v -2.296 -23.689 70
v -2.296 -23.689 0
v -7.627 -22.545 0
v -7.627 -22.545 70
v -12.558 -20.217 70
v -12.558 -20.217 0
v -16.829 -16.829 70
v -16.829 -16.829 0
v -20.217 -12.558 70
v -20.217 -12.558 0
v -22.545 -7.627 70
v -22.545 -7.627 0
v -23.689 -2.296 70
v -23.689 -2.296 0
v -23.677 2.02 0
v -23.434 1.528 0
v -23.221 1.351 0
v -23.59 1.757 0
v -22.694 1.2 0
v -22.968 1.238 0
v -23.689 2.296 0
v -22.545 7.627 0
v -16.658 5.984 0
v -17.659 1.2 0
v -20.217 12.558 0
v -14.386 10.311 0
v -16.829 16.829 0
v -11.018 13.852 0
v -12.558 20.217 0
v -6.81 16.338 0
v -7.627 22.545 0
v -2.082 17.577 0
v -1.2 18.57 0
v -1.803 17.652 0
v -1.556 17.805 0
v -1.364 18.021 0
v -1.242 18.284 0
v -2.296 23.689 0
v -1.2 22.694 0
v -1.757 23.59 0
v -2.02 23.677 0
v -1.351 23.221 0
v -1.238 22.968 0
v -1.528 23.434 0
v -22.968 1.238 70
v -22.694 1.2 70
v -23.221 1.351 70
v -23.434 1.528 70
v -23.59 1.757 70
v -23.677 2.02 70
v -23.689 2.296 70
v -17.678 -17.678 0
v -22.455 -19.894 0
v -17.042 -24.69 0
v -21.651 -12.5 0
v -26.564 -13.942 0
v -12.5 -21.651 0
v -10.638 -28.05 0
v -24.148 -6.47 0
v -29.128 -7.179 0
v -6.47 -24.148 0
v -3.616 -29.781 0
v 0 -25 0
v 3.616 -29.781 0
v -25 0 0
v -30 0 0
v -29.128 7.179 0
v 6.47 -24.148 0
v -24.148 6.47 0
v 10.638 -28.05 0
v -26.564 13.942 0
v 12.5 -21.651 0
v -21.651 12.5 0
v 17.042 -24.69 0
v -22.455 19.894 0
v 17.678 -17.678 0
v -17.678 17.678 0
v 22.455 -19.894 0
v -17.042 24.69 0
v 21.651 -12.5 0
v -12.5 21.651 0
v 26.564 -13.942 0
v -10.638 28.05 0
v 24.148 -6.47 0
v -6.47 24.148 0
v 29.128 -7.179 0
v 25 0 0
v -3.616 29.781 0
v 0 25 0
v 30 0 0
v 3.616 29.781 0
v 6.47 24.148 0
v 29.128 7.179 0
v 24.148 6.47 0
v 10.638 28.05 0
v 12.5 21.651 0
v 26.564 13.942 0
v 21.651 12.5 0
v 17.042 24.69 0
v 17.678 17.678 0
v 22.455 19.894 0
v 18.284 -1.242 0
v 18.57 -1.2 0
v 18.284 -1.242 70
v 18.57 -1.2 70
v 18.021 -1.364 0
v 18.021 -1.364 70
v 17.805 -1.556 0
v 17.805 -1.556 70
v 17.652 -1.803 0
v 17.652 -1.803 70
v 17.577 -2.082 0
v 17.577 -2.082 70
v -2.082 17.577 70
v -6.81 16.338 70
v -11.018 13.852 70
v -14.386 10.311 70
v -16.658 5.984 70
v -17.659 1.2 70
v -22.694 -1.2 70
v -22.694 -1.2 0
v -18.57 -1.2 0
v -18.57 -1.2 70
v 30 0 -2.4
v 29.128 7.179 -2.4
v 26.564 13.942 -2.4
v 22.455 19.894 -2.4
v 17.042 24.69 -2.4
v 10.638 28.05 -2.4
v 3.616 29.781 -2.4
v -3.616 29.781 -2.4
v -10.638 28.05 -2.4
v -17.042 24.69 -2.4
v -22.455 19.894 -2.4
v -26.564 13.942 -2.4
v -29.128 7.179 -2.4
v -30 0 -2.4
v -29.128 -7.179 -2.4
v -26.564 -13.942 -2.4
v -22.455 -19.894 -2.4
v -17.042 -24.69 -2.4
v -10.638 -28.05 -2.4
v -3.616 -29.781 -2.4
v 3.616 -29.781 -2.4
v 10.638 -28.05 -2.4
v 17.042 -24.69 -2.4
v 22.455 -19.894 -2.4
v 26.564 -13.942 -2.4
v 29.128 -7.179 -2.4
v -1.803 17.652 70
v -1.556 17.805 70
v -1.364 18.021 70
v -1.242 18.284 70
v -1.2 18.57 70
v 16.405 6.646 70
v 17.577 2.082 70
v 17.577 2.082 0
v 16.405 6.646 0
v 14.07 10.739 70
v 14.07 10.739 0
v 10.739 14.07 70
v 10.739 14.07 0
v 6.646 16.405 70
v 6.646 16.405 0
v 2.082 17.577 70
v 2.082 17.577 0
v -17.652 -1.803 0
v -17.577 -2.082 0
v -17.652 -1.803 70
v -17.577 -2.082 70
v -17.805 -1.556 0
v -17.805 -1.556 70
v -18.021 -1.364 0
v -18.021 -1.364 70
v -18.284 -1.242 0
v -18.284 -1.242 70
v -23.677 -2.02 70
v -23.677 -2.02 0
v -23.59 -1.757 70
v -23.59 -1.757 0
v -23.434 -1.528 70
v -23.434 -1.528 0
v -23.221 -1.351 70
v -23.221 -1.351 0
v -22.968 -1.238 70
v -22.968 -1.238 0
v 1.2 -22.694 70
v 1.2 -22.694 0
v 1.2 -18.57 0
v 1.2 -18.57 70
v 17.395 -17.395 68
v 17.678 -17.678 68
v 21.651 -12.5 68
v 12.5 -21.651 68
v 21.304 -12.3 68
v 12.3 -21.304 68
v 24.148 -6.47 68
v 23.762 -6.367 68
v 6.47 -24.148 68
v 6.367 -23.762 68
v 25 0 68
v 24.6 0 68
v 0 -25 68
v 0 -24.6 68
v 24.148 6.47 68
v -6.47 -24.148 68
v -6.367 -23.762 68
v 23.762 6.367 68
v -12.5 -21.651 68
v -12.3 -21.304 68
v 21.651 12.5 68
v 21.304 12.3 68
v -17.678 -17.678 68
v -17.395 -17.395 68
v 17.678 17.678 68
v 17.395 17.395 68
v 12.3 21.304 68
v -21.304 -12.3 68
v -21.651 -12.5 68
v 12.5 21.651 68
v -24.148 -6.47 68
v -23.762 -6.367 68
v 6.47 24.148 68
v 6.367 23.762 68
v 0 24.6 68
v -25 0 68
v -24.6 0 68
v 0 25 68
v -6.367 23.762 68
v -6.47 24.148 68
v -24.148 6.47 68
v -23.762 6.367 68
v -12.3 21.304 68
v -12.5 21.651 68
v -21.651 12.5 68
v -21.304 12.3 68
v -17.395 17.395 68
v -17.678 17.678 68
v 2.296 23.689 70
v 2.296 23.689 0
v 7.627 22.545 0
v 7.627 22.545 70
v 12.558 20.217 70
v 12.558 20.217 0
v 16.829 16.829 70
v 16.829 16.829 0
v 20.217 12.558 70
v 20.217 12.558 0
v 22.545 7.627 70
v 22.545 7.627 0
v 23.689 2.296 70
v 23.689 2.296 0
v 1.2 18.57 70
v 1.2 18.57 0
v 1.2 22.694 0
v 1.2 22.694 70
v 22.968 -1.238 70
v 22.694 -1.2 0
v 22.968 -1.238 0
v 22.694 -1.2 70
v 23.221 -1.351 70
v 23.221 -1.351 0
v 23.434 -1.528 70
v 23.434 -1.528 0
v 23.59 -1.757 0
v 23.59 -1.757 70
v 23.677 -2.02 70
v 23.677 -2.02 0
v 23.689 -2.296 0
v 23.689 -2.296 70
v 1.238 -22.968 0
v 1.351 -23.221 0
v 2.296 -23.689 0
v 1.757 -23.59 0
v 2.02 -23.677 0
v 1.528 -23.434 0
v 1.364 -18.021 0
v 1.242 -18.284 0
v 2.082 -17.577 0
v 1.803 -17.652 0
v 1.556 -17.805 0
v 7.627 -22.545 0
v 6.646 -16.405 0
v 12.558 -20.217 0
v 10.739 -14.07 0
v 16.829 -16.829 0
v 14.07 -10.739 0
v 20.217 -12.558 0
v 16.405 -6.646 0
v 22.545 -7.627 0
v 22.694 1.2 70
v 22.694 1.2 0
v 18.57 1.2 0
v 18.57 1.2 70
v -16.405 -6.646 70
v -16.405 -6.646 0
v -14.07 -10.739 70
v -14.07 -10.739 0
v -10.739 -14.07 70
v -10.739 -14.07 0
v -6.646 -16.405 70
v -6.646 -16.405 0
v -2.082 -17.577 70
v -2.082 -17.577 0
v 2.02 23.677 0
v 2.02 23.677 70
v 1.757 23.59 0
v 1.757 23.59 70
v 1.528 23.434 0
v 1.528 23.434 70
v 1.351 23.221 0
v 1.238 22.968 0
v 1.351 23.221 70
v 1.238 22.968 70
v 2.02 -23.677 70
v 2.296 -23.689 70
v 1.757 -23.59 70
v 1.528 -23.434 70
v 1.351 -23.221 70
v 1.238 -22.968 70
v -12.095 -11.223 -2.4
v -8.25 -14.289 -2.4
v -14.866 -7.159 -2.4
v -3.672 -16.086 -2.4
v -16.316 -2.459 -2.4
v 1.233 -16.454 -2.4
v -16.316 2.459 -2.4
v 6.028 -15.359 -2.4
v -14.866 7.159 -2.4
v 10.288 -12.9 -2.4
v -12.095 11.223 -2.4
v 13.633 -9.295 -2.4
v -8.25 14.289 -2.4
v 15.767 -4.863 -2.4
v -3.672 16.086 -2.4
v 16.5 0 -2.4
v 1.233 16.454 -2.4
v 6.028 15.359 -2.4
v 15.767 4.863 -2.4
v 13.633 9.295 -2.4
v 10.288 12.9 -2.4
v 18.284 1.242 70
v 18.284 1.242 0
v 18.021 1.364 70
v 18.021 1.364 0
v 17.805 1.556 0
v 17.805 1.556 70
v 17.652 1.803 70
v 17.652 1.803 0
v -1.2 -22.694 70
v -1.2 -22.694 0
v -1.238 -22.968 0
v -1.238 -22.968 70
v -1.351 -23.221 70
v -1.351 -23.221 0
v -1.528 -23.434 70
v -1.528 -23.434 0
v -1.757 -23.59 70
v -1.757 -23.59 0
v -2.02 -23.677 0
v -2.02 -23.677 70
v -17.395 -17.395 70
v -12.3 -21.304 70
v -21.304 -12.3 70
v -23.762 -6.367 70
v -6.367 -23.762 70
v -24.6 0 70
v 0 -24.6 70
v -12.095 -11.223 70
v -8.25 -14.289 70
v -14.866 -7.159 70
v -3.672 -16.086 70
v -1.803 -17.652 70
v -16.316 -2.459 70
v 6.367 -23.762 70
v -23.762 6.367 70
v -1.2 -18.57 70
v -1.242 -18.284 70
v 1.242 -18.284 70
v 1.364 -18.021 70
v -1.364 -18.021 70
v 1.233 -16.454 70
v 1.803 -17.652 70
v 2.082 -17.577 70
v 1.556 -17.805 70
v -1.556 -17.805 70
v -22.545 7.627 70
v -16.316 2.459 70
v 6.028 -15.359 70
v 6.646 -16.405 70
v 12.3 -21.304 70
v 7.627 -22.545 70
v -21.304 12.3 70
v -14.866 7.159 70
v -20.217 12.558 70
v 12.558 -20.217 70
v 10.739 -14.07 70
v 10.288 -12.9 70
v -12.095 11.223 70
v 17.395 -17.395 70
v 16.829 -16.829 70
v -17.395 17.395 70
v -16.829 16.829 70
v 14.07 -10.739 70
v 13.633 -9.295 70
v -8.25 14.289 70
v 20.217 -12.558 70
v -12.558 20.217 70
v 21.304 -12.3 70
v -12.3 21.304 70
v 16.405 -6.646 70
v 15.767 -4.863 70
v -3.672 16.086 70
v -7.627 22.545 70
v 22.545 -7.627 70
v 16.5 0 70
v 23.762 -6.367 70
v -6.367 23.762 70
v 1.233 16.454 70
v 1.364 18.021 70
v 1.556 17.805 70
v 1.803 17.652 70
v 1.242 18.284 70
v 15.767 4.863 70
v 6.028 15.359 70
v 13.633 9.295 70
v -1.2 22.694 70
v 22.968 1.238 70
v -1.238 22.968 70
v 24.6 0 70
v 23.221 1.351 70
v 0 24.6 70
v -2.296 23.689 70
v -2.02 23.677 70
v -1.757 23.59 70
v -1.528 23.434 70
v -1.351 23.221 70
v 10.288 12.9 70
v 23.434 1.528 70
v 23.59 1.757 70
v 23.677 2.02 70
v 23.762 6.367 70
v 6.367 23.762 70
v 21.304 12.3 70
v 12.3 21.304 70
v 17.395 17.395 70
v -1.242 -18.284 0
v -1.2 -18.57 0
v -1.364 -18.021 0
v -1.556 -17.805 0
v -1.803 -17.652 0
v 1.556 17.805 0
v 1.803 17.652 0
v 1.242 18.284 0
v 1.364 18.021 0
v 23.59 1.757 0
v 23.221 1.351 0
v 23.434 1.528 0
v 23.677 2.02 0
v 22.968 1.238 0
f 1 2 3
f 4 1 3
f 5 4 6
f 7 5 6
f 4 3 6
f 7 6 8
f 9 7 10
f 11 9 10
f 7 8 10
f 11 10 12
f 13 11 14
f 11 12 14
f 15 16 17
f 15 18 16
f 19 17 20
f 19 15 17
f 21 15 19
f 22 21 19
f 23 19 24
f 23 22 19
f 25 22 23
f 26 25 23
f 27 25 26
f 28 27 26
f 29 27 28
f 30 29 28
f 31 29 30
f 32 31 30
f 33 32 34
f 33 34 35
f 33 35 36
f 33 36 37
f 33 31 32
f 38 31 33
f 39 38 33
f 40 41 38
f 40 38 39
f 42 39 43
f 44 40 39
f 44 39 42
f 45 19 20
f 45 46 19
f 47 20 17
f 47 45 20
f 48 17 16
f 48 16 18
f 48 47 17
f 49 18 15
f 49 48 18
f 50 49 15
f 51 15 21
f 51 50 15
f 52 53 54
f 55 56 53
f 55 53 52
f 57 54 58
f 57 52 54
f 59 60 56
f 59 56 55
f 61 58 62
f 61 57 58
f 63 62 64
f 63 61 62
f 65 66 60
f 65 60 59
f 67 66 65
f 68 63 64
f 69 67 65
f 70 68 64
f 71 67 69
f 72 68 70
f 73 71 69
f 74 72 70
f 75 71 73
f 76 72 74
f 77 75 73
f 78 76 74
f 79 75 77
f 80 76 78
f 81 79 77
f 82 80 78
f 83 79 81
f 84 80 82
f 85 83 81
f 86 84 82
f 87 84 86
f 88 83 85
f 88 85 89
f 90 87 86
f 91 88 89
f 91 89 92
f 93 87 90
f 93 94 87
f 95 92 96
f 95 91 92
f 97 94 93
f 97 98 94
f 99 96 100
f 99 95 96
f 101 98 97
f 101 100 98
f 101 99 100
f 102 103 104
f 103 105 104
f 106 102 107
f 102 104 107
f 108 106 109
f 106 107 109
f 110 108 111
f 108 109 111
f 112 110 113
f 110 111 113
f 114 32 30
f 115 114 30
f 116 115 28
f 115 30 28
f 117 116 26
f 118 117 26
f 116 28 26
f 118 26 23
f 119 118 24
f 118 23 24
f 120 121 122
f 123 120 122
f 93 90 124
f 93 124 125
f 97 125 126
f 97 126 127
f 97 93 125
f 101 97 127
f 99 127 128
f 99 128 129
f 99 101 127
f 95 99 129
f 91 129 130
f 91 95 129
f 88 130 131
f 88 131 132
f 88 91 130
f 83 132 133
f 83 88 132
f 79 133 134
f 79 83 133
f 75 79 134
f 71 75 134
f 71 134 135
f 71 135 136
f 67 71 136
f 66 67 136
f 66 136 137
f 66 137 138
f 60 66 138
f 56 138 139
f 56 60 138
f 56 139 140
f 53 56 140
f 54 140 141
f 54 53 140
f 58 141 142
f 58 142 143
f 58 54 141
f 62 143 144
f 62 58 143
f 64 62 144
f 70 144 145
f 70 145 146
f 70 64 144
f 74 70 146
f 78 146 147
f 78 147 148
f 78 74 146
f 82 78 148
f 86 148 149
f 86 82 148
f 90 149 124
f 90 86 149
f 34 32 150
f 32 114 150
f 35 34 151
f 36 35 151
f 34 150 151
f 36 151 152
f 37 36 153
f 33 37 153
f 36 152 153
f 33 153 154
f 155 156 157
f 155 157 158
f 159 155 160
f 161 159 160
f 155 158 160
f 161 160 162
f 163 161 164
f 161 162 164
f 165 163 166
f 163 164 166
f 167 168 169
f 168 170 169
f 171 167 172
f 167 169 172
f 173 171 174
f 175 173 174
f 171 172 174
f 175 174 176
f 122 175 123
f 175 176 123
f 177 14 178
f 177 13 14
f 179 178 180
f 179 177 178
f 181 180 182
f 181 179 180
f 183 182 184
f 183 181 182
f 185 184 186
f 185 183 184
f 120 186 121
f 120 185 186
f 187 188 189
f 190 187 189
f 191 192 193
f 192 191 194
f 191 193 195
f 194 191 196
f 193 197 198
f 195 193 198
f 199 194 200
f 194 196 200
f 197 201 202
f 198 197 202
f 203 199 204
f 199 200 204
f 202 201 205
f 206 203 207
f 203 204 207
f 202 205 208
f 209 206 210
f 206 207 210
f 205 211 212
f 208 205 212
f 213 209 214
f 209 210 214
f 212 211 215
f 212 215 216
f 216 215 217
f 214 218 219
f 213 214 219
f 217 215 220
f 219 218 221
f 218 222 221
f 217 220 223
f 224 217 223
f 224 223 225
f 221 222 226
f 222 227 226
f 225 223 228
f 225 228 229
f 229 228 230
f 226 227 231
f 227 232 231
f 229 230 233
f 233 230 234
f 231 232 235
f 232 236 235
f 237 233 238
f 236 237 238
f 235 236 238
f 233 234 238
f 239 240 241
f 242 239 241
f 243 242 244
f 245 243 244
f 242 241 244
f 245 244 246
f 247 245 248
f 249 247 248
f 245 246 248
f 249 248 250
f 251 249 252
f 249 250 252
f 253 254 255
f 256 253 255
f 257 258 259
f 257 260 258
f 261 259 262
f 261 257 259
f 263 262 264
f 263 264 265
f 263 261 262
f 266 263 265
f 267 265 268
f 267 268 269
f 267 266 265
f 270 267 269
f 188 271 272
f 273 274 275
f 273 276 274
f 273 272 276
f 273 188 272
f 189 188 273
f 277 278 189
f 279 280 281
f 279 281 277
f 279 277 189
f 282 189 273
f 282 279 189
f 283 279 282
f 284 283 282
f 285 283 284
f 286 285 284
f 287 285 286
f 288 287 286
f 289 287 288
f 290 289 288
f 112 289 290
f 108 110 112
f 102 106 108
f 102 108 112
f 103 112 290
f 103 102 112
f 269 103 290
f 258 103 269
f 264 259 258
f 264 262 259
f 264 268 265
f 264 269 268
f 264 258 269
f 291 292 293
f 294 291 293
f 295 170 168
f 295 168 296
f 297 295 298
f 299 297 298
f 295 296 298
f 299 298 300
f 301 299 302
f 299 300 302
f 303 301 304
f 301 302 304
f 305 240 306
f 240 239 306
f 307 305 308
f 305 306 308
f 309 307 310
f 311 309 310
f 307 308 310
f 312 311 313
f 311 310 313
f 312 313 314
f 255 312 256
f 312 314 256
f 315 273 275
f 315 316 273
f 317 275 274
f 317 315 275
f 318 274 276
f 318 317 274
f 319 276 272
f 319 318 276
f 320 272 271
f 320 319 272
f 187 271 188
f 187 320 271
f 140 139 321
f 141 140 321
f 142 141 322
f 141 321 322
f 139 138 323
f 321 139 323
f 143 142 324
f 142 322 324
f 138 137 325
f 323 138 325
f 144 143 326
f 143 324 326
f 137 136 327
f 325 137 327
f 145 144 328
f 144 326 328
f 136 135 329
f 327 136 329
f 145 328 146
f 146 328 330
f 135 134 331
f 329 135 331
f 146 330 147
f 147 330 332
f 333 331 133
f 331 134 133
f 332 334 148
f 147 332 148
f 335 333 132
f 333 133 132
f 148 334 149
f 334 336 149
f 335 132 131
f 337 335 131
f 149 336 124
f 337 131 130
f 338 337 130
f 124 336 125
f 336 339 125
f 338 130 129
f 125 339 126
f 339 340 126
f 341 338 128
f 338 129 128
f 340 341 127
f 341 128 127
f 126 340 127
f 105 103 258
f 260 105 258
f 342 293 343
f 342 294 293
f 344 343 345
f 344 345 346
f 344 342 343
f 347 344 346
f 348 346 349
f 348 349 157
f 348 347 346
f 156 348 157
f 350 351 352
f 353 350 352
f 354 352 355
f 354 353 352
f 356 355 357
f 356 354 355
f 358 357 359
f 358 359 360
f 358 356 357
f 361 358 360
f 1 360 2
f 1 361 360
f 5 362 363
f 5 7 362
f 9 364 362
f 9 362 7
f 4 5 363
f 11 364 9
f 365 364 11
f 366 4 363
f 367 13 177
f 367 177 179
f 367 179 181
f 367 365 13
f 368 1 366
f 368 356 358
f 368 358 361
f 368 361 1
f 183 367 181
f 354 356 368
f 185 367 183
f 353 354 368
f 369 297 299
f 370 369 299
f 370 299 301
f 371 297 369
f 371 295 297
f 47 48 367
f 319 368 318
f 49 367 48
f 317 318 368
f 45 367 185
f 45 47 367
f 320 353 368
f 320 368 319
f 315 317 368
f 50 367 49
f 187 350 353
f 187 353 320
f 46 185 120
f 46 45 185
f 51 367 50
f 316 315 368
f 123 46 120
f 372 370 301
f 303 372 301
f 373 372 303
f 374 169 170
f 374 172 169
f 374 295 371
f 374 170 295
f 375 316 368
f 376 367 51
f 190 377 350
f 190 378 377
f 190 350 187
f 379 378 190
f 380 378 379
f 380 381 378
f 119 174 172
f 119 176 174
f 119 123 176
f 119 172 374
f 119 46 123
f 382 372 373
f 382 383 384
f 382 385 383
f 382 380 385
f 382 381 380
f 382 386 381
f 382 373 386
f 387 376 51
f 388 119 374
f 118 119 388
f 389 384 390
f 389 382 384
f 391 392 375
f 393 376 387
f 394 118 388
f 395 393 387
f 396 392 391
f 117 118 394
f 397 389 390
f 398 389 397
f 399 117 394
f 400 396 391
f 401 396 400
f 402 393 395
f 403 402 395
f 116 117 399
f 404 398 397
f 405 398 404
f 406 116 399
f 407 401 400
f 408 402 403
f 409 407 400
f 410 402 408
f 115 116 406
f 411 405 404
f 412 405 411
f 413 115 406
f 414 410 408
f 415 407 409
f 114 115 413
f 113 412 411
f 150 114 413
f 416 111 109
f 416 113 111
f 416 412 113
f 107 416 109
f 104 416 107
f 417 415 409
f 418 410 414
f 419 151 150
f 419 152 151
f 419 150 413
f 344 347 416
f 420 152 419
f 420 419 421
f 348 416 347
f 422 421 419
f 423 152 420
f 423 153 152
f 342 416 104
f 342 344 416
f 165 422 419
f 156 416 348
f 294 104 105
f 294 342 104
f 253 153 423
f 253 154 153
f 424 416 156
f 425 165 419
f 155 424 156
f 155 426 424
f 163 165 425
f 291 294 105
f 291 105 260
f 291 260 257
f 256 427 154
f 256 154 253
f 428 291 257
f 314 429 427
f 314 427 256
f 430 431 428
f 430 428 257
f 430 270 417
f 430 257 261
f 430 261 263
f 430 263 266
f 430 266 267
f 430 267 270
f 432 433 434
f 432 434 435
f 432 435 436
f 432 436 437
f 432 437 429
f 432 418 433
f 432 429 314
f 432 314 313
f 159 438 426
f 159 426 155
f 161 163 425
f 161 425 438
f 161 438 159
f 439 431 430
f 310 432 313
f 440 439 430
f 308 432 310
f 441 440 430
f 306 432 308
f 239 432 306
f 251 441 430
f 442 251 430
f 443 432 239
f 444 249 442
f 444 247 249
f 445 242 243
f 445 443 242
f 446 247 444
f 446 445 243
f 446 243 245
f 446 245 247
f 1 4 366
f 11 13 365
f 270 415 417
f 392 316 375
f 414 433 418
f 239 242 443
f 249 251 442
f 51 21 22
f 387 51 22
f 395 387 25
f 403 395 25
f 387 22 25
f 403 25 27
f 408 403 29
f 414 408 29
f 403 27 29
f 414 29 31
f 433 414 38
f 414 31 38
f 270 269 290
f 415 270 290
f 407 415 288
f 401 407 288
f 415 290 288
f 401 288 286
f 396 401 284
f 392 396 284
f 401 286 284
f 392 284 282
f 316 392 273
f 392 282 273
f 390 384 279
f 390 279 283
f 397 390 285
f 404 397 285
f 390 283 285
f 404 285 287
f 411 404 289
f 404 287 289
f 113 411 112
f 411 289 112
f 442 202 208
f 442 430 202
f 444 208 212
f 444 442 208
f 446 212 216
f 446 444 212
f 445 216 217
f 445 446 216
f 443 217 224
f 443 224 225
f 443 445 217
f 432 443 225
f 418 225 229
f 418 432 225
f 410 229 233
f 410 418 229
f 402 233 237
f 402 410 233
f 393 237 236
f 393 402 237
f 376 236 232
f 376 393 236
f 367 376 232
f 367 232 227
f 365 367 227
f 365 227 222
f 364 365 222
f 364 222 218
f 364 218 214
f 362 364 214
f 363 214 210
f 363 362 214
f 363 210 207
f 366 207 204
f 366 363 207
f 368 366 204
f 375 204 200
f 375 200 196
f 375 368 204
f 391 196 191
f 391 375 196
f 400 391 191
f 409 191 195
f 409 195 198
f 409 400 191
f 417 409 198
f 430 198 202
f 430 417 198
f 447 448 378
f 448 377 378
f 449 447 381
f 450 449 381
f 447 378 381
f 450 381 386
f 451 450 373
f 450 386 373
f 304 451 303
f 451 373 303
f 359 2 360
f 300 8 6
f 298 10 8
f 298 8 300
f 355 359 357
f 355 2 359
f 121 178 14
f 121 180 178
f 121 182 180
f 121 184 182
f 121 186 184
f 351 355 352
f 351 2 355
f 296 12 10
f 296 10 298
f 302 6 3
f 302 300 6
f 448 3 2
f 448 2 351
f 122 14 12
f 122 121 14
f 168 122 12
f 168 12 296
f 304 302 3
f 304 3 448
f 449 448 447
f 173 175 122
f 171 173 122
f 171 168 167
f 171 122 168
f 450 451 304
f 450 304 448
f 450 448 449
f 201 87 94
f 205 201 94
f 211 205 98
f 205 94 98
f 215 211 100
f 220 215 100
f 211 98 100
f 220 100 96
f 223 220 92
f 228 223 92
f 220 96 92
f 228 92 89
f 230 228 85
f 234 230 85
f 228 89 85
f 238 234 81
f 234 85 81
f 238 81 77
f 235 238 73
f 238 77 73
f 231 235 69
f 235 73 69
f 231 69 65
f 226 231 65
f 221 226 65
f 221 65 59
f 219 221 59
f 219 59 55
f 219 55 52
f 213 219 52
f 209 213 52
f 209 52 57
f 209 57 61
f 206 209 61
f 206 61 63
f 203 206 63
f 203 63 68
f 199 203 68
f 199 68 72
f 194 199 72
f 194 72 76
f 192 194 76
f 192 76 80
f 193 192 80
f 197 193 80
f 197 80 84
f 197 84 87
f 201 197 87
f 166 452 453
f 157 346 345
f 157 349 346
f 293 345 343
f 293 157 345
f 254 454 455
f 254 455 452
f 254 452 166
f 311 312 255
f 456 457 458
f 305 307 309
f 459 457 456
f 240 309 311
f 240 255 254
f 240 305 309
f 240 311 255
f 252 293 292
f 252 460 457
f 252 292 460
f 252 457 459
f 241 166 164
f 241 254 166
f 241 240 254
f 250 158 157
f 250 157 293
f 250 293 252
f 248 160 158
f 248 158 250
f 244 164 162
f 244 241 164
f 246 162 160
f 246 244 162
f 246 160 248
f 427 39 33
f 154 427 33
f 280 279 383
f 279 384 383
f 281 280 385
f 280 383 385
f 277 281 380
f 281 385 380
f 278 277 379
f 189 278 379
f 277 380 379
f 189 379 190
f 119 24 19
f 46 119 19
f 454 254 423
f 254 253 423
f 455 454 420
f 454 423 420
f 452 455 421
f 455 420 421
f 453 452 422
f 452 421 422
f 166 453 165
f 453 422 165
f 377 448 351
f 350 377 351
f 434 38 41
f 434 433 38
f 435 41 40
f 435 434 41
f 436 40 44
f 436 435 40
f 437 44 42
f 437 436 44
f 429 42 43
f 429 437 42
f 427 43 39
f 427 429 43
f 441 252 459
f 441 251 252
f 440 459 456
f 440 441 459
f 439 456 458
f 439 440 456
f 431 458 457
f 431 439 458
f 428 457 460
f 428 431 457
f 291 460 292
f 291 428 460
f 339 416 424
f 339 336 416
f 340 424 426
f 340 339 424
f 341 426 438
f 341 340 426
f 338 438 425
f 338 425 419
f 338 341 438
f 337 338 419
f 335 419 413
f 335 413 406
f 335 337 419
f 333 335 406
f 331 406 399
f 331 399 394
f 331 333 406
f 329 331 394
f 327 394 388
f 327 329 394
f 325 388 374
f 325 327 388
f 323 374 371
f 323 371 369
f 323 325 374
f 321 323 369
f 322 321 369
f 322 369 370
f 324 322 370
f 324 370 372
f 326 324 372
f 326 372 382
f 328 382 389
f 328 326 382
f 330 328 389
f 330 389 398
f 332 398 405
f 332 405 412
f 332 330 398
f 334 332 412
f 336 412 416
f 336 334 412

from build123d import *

# Parameters (mm, degrees)
F1_R     = 30
F1_R_2   = 16.5
F2_DEPTH = 2.4
F0_R     = 25
F0_R_2   = 16.5
F3_DEPTH = 70
F4_W     = 0.4
F4_H     = 2
F6_R     = 1


with BuildPart() as f2:
    # F1 (on Top) → F2 (new body)
    with BuildSketch(Plane.XY):
        Circle(F1_R)
        Circle(F1_R_2, mode=Mode.SUBTRACT)
    extrude(amount=-F2_DEPTH)

    # F0 (on Top) → F3 (join)
    with BuildSketch(Plane.XY):
        Circle(F0_R)
        with BuildLine():
            ThreePointArc((23.769729, 1.2), (23.792431, 0.600191), (23.8, 0))
            ThreePointArc((23.8, 0), (23.792431, -0.600191), (23.769729, -1.2))
            ThreePointArc((23.769729, -1.2), (16.829141, -16.829141), (1.2, -23.769729))
            ThreePointArc((1.2, -23.769729), (0, -23.8), (-1.2, -23.769729))
            ThreePointArc((-1.2, -23.769729), (-16.829141, -16.829141), (-23.769729, -1.2))
            ThreePointArc((-23.769729, -1.2), (-23.8, 0), (-23.769729, 1.2))
            ThreePointArc((-23.769729, 1.2), (-16.829141, 16.829141), (-1.2, 23.769729))
            ThreePointArc((-1.2, 23.769729), (0, 23.8), (1.2, 23.769729))
            ThreePointArc((1.2, 23.769729), (16.829141, 16.829141), (23.769729, 1.2))
        make_face(mode=Mode.SUBTRACT)
        with BuildLine():
            Line((-17.659275, 1.2), (-23.769729, 1.2))
            ThreePointArc((-23.769729, 1.2), (-23.8, 0), (-23.769729, -1.2))
            Line((-23.769729, -1.2), (-17.659275, -1.2))
            ThreePointArc((-17.659275, -1.2), (-17.7, 0), (-17.659275, 1.2))
        make_face()
        with BuildLine():
            Line((1.2, 17.659275), (1.2, 23.769729))
            ThreePointArc((1.2, 23.769729), (0, 23.8), (-1.2, 23.769729))
            Line((-1.2, 23.769729), (-1.2, 17.659275))
            ThreePointArc((-1.2, 17.659275), (0, 17.7), (1.2, 17.659275))
        make_face()
        with BuildLine():
            ThreePointArc((23.769729, -1.2), (23.792431, -0.600191), (23.8, 0))
            ThreePointArc((23.8, 0), (23.792431, 0.600191), (23.769729, 1.2))
            Line((23.769729, 1.2), (17.659275, 1.2))
            ThreePointArc((17.659275, 1.2), (17.689816, 0.600345), (17.7, 0))
            ThreePointArc((17.7, 0), (17.689816, -0.600345), (17.659275, -1.2))
            Line((17.659275, -1.2), (23.769729, -1.2))
        make_face()
        with BuildLine():
            ThreePointArc((-1.2, -23.769729), (0, -23.8), (1.2, -23.769729))
            Line((1.2, -23.769729), (1.2, -17.659275))
            ThreePointArc((1.2, -17.659275), (0, -17.7), (-1.2, -17.659275))
            Line((-1.2, -17.659275), (-1.2, -23.769729))
        make_face()
        with BuildLine():
            ThreePointArc((17.7, 0), (17.689816, 0.600345), (17.659275, 1.2))
            ThreePointArc((17.659275, 1.2), (12.51579, 12.51579), (1.2, 17.659275))
            ThreePointArc((1.2, 17.659275), (0, 17.7), (-1.2, 17.659275))
            ThreePointArc((-1.2, 17.659275), (-12.51579, 12.51579), (-17.659275, 1.2))
            ThreePointArc((-17.659275, 1.2), (-17.7, 0), (-17.659275, -1.2))
            ThreePointArc((-17.659275, -1.2), (-12.51579, -12.51579), (-1.2, -17.659275))
            ThreePointArc((-1.2, -17.659275), (0, -17.7), (1.2, -17.659275))
            ThreePointArc((1.2, -17.659275), (12.51579, -12.51579), (17.659275, -1.2))
            ThreePointArc((17.659275, -1.2), (17.689816, -0.600345), (17.7, 0))
        make_face()
        Circle(F0_R_2, mode=Mode.SUBTRACT)
    extrude(amount=F3_DEPTH)

    # F4 (on Front) → F5 (revolve, cut)
    with BuildSketch(Plane.XZ):
        with Locations((24.8, 69)):
            Rectangle(F4_W, F4_H)
    revolve(axis=Axis((0, 0, 41.403618), (0, 0, 1)), mode=Mode.SUBTRACT)

    # F6
    f6_edges = [f2.edges().sort_by_distance(p)[0] for p in [
        (-1.2, 23.769729, 35),
        (-1.2, 17.659275, 35),
        (1.2, 23.769729, 35),
        (1.2, 17.659275, 35),
        (17.659275, 1.2, 35),
        (17.659275, -1.2, 35),
        (1.2, -17.659275, 35),
        (-1.2, -17.659275, 35),
        (-17.659275, -1.2, 35),
        (1.2, -23.769729, 35),
        (23.769729, -1.2, 35),
        (23.769729, 1.2, 35),
        (-1.2, -23.769729, 35),
        (-23.769729, -1.2, 35),
        (-23.769729, 1.2, 35),
    ]]
    fillet(f6_edges, radius=F6_R)


solid = f2.part
